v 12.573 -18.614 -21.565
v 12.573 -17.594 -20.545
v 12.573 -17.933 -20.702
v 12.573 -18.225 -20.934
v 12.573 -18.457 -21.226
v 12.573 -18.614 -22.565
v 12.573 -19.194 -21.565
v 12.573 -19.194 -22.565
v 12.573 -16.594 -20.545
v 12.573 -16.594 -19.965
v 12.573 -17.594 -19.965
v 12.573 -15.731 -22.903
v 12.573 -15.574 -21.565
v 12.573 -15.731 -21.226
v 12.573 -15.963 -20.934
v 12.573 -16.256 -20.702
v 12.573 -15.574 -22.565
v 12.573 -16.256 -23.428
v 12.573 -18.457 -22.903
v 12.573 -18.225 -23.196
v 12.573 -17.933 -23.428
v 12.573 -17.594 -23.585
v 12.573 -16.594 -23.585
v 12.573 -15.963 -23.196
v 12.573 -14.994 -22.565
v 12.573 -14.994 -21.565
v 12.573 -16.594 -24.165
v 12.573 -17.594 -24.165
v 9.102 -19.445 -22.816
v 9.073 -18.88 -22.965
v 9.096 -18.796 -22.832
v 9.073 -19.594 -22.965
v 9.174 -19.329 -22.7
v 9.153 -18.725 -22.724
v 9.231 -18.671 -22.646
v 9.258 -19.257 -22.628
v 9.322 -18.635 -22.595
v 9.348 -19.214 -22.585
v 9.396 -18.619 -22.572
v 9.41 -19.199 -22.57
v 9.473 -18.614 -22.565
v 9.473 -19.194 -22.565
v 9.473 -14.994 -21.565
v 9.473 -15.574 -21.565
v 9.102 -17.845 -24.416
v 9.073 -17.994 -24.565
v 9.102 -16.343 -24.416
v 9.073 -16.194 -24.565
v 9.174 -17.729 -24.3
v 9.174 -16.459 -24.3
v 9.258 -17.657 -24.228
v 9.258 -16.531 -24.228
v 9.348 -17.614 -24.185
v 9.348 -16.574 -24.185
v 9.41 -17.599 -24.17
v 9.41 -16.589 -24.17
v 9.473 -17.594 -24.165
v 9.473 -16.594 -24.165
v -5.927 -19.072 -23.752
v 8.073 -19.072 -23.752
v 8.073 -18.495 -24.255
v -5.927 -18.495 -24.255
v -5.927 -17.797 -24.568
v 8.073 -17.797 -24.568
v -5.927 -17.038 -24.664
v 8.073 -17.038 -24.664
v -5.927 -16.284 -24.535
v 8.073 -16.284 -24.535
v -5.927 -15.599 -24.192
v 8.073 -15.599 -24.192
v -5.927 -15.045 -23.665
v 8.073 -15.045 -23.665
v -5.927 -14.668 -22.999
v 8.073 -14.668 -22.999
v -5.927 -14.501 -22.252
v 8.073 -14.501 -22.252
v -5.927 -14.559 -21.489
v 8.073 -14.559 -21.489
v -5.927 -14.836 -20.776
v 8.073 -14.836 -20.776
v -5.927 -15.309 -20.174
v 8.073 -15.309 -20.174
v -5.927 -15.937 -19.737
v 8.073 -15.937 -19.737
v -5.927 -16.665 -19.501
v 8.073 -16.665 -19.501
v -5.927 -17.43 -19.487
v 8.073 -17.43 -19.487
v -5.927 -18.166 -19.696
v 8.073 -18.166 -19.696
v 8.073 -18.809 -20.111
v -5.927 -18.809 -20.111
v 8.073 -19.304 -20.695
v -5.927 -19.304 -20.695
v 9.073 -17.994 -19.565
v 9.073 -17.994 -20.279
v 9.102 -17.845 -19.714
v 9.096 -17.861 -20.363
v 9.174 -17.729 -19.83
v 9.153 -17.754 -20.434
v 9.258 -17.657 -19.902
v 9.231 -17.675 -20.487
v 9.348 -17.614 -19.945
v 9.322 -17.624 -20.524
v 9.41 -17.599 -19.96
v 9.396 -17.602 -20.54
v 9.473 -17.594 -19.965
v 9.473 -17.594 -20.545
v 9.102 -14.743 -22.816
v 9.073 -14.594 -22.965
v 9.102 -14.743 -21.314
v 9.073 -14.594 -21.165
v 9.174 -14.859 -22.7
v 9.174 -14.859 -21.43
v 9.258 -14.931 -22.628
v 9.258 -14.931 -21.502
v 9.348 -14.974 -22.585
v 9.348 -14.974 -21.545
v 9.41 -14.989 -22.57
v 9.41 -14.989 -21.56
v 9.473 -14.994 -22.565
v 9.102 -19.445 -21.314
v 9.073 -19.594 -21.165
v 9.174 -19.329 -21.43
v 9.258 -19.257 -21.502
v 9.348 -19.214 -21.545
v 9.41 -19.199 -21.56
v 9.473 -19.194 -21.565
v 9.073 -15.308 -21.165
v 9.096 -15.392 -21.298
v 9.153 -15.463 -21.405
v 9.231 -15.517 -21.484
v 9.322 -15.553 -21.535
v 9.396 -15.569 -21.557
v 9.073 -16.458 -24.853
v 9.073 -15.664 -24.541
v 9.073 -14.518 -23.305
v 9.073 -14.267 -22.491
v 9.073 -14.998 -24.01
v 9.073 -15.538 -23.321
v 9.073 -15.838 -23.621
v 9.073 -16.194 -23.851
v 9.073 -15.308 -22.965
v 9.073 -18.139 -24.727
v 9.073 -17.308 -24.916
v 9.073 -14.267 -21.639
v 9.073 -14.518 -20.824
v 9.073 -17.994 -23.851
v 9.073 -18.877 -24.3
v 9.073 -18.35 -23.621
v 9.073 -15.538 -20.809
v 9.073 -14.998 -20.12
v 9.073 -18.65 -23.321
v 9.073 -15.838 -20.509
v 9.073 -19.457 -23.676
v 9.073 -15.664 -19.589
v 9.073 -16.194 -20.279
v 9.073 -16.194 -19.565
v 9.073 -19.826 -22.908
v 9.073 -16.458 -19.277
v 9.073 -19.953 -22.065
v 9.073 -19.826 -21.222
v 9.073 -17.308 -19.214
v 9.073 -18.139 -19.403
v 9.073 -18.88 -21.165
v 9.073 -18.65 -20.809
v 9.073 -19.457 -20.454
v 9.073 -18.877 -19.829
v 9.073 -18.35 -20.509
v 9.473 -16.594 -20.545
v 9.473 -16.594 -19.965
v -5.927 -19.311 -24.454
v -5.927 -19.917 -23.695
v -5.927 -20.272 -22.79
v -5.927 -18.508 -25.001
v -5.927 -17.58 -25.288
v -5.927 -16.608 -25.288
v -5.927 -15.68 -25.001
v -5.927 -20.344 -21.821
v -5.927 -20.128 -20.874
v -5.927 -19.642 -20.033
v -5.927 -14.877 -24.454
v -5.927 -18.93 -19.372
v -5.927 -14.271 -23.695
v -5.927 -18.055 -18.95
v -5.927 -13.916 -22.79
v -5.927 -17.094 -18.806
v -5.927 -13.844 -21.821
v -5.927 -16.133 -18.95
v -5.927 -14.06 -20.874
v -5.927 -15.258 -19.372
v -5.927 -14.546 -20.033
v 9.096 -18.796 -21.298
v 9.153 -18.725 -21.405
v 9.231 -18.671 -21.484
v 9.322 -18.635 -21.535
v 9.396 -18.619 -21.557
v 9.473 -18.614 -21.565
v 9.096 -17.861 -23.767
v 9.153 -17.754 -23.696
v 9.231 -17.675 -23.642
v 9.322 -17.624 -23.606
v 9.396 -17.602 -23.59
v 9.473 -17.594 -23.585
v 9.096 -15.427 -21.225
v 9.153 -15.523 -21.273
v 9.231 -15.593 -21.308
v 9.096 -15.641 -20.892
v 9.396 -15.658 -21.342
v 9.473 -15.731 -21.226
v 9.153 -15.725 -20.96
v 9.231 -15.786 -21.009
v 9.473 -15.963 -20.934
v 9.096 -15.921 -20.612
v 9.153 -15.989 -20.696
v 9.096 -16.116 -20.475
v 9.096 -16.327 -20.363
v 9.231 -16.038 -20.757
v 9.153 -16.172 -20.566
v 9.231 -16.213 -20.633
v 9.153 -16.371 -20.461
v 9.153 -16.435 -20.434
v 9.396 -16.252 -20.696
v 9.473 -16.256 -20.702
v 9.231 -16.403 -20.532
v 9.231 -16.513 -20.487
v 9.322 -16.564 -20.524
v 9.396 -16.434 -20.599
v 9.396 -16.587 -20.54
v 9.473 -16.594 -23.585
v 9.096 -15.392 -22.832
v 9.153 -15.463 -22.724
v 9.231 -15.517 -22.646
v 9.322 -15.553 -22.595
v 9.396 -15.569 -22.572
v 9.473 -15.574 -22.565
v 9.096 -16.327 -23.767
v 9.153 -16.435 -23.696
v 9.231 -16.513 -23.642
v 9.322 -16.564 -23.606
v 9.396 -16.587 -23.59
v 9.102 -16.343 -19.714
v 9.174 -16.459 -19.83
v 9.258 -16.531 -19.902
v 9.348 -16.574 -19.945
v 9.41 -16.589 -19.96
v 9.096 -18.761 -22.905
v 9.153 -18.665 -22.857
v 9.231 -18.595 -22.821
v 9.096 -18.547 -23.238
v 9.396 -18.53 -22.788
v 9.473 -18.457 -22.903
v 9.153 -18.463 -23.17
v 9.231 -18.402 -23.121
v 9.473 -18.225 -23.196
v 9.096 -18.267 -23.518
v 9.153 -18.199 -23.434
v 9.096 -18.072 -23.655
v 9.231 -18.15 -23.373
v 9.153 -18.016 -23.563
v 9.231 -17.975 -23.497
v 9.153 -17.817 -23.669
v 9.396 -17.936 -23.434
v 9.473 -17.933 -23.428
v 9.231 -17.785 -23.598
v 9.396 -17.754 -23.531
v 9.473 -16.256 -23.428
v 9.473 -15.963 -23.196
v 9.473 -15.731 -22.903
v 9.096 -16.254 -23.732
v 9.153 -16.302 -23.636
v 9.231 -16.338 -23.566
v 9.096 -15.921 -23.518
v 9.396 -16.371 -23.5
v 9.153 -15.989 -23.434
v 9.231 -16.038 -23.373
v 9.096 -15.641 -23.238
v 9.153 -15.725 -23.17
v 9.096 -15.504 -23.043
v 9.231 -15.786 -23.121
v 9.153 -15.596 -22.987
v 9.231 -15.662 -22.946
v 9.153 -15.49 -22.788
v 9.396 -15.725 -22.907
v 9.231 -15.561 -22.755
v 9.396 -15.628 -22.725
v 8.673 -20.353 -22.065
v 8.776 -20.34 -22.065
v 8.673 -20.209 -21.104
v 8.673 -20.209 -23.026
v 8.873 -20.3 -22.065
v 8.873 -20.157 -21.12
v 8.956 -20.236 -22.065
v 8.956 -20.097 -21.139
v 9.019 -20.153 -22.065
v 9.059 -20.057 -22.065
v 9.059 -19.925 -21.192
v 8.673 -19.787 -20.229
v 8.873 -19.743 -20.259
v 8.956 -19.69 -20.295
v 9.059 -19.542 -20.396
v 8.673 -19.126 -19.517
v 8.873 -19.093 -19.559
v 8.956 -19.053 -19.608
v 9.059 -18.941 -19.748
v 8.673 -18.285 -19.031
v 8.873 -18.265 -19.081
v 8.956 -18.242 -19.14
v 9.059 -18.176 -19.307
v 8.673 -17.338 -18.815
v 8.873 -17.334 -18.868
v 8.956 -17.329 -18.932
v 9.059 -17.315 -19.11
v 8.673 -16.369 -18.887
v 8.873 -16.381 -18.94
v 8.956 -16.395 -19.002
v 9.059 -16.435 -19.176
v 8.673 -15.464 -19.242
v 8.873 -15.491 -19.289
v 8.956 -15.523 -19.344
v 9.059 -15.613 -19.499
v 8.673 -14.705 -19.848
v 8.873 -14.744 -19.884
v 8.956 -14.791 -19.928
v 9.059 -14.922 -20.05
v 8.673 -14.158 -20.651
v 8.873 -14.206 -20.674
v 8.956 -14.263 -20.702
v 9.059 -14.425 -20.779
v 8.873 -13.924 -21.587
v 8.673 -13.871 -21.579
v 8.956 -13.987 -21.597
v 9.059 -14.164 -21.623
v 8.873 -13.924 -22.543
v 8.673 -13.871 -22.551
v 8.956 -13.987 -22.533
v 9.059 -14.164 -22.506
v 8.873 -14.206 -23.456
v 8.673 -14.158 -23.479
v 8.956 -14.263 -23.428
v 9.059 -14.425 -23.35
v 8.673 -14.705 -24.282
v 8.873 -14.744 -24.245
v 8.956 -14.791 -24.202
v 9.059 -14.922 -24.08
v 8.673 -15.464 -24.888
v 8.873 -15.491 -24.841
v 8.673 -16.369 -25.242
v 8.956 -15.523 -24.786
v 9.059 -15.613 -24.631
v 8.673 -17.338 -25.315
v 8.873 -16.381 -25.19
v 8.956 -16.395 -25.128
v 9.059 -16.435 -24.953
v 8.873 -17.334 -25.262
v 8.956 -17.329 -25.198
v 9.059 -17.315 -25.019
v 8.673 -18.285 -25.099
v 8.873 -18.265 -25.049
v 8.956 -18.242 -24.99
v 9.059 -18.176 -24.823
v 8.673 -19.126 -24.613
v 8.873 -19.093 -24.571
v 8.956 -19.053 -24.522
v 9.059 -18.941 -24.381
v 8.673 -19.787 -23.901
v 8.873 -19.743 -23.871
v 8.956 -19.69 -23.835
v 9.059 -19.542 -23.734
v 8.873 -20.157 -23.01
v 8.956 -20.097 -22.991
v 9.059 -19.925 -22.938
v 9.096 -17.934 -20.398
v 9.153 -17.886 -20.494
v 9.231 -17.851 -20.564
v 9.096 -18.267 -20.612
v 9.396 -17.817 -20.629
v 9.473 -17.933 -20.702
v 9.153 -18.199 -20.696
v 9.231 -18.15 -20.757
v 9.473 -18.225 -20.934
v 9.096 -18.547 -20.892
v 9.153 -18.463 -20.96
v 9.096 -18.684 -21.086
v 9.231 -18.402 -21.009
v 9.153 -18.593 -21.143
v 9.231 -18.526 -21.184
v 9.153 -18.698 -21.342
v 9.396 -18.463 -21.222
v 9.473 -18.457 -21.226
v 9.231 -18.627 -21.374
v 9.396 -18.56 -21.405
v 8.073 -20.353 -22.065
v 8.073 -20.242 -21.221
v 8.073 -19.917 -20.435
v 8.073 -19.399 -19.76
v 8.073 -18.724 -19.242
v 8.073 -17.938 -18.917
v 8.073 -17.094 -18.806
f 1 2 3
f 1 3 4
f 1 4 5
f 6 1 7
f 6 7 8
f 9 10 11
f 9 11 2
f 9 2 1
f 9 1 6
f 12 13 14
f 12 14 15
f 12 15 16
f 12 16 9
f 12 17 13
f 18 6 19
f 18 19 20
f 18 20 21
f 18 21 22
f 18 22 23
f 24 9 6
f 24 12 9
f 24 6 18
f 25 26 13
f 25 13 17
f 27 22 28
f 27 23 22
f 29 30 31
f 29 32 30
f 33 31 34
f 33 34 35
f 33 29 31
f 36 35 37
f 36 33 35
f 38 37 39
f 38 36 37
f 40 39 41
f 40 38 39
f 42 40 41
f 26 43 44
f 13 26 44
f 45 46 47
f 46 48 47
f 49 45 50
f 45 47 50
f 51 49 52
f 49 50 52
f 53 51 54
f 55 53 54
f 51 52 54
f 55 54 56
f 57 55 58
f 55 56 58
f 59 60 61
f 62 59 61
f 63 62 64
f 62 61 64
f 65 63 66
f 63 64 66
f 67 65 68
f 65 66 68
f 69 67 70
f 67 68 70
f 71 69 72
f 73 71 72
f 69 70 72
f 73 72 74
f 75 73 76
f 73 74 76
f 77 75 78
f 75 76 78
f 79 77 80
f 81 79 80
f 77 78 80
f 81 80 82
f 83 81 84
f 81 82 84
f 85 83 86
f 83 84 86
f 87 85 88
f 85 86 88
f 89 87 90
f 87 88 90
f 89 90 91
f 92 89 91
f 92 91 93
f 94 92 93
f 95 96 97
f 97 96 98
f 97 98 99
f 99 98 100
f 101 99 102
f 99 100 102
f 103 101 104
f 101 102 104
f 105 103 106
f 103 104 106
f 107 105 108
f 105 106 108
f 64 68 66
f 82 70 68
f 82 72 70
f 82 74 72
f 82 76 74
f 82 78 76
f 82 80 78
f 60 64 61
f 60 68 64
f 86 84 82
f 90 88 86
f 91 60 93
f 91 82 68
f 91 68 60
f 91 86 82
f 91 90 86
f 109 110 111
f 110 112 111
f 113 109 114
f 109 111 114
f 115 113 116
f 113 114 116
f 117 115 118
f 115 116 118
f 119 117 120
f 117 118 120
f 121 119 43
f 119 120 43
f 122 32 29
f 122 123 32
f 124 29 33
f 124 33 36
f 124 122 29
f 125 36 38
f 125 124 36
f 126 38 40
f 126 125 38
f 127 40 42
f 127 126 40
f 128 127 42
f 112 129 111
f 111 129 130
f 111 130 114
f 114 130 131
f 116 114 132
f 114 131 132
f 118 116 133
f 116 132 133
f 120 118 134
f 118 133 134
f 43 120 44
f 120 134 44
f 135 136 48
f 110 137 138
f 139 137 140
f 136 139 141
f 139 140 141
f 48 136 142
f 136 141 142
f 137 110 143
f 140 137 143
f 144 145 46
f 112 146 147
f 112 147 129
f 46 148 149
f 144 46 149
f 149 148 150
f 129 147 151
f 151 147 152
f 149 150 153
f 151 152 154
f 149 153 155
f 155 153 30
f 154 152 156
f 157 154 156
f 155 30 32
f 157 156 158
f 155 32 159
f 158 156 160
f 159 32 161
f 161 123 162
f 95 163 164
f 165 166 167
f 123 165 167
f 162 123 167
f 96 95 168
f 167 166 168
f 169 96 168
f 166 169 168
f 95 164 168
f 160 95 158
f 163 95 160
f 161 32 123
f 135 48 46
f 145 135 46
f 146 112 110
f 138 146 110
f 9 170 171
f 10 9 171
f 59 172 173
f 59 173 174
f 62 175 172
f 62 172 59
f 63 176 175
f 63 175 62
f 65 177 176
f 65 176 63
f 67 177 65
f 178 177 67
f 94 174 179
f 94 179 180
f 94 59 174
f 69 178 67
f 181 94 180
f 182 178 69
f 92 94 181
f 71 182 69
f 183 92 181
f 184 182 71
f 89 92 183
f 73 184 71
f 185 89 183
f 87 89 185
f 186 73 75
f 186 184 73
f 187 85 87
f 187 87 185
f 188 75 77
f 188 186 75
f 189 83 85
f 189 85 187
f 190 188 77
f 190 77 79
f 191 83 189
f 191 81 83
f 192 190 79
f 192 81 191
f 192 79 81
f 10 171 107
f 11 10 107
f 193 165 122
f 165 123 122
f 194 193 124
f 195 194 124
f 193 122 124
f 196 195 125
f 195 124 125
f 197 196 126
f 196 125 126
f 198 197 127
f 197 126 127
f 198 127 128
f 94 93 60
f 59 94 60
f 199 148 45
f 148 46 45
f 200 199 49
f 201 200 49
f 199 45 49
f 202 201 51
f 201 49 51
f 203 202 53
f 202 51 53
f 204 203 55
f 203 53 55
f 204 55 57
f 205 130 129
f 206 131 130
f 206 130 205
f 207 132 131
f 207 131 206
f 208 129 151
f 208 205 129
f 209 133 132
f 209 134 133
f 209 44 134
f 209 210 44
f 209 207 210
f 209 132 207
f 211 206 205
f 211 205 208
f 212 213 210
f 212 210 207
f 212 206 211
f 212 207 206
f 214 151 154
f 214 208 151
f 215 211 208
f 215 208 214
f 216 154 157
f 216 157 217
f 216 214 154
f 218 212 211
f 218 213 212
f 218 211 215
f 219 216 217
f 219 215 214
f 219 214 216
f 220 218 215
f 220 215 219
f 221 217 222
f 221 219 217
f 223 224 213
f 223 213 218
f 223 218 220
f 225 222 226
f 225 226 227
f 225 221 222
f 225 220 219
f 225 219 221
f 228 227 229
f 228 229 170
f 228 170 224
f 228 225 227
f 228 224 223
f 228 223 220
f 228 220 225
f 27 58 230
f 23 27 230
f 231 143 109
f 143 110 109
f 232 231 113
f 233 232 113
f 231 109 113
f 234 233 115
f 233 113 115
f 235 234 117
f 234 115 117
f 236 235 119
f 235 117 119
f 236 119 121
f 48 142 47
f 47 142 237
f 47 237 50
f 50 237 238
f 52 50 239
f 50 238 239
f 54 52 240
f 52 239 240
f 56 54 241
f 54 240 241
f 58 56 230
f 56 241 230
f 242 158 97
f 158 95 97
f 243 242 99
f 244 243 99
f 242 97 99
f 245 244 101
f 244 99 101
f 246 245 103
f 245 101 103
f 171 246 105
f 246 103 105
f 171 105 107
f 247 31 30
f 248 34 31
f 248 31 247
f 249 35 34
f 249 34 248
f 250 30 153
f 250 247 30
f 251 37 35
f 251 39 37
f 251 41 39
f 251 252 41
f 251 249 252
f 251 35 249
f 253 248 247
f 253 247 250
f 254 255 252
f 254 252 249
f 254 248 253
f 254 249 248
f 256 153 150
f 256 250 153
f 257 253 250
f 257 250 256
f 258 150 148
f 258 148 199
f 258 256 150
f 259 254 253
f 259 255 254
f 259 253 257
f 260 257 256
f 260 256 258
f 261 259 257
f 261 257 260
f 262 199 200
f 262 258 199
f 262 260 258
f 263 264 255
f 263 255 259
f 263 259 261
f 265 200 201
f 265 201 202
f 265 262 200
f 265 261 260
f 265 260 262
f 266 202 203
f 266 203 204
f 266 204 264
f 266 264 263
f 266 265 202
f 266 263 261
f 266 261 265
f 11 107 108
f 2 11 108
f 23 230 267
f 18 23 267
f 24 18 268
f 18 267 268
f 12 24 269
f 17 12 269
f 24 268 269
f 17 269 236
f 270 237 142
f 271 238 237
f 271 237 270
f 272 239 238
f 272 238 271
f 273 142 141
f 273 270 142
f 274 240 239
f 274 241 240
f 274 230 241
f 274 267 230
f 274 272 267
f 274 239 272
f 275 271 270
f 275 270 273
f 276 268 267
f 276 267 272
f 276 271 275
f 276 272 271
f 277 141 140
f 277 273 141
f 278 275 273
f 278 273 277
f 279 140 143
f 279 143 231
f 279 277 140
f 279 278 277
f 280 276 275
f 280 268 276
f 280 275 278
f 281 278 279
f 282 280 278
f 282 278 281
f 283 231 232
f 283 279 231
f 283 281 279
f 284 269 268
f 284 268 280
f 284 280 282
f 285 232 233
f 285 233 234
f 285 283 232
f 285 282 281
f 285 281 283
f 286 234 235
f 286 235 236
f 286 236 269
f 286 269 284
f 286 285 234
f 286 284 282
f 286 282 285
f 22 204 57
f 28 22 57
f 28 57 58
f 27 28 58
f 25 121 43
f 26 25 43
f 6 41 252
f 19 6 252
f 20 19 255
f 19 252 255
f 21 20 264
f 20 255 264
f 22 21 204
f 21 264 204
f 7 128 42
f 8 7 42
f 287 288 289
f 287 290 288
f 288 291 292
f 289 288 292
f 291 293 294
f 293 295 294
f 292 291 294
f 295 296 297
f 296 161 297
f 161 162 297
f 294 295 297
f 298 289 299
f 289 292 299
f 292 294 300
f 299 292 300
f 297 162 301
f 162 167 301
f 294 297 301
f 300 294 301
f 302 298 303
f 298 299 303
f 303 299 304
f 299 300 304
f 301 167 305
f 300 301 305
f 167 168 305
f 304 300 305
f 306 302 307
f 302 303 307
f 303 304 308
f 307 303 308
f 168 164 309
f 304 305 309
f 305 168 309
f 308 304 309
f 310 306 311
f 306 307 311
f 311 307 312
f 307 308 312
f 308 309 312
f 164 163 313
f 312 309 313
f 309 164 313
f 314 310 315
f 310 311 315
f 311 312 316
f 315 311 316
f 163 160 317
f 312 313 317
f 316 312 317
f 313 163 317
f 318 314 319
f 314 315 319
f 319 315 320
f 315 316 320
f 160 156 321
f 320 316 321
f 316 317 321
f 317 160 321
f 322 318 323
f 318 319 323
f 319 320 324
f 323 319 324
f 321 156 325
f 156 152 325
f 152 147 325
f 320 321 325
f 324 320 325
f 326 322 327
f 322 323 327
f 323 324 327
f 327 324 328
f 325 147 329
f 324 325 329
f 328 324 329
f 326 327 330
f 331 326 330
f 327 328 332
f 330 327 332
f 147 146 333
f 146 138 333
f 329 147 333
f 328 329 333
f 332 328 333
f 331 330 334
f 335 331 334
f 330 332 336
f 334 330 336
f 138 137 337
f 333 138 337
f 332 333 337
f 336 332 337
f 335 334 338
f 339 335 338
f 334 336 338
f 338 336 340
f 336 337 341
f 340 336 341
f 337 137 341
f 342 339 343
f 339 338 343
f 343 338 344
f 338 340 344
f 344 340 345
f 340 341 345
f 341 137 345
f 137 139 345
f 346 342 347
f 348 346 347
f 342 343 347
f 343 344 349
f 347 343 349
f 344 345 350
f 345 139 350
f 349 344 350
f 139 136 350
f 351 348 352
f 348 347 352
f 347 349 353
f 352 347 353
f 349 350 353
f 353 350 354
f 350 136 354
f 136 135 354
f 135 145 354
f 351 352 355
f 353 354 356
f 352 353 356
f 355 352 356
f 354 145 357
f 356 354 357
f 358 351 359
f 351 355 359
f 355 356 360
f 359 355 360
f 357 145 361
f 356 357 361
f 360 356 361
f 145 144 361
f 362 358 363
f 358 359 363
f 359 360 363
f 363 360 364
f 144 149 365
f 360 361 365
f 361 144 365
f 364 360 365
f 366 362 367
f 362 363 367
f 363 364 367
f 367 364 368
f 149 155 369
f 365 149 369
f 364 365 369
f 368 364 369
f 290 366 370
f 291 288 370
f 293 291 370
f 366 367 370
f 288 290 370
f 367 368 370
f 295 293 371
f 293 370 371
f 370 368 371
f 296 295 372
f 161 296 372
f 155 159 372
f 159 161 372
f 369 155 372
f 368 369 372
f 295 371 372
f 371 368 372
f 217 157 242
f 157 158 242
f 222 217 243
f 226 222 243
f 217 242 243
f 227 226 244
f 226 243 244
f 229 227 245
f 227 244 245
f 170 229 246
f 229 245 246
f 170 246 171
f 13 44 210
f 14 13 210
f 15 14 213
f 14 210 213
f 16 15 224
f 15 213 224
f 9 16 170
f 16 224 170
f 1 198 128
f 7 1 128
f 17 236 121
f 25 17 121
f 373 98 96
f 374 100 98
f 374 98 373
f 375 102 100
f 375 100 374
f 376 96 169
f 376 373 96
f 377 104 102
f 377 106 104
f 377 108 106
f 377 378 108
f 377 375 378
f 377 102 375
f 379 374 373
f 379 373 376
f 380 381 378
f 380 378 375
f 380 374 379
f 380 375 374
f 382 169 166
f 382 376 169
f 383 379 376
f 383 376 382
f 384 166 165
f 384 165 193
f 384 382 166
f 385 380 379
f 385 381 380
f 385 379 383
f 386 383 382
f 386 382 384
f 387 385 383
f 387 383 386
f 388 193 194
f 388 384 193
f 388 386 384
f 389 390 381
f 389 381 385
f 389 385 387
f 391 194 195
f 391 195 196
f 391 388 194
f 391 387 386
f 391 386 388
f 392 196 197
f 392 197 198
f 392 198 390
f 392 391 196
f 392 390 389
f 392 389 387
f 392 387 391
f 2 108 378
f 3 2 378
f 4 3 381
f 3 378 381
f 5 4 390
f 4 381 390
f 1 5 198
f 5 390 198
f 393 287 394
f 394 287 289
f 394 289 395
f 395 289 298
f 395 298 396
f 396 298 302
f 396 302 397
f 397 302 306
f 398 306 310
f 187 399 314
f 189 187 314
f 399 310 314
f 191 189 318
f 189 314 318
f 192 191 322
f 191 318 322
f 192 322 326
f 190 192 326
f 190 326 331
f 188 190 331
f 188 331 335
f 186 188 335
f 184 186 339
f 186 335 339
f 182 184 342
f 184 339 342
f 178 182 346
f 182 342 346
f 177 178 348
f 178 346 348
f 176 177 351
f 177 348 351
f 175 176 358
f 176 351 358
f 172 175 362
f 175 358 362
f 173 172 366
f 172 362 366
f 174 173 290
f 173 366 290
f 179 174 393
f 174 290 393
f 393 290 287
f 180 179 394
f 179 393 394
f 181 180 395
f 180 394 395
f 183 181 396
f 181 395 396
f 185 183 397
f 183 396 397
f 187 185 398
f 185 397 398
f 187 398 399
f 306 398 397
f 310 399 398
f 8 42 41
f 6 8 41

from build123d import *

# Parameters (mm, degrees)
BOSS_EXTRUDE1_DEPTH = 3.5
SKETCH1_3_R         = 3.259306638
BOSS_EXTRUDE2_DEPTH = 1
SKETCH1_4_R         = 3.259306638
BOSS_EXTRUDE3_DEPTH = 15
FILLET1_R           = 0.4


with BuildPart() as part:
    # Sketch1 → Boss-Extrude1 (new body)
    with BuildSketch(Plane.ZY.offset(-9.072873839)):
        with BuildLine():
            Line((-22.564889637, -14.994040891), (-21.564889637, -14.994040891))
            Line((-21.564889637, -14.994040891), (-21.564889637, -15.574172475))
            ThreePointArc((-21.564889637, -15.574172475), (-20.933518787, -15.962670041), (-20.545021222, -16.594040891))
            Line((-20.545021222, -16.594040891), (-19.964889637, -16.594040891))
            Line((-19.964889637, -16.594040891), (-19.964889637, -17.594040891))
            Line((-19.964889637, -17.594040891), (-20.545021222, -17.594040891))
            ThreePointArc((-20.545021222, -17.594040891), (-20.933518787, -18.225411741), (-21.564889637, -18.613909306))
            Line((-21.564889637, -18.613909306), (-21.564889637, -19.194040891))
            Line((-21.564889637, -19.194040891), (-22.564889637, -19.194040891))
            Line((-22.564889637, -19.194040891), (-22.564889637, -18.613909306))
            ThreePointArc((-22.564889637, -18.613909306), (-23.196260487, -18.225411741), (-23.584758053, -17.594040891))
            Line((-23.584758053, -17.594040891), (-24.164889637, -17.594040891))
            Line((-24.164889637, -17.594040891), (-24.164889637, -16.594040891))
            Line((-24.164889637, -16.594040891), (-23.584758053, -16.594040891))
            ThreePointArc((-23.584758053, -16.594040891), (-23.196260487, -15.962670041), (-22.564889637, -15.574172475))
            Line((-22.564889637, -15.574172475), (-22.564889637, -14.994040891))
        make_face()
    extrude(amount=-BOSS_EXTRUDE1_DEPTH)

    # Sketch1<3> → Boss-Extrude2 (add)
    with BuildSketch(Plane.ZY.offset(-9.072873839)):
        with Locations((-22.064889637, -17.094040891)):
            Circle(SKETCH1_3_R)
    extrude(amount=BOSS_EXTRUDE2_DEPTH)

    # Sketch1<4> → Boss-Extrude3 (add)
    with BuildSketch(Plane.ZY.offset(-9.072873839)):
        with Locations((-22.064889637, -17.094040891)):
            Circle(SKETCH1_4_R)
        with BuildLine():
            ThreePointArc((-23.752066801, -19.072280821), (-21.868548232, -14.501464942), (-20.694879361, -19.303808263))
            Line((-20.694879361, -19.303808263), (-23.752066801, -19.072280821))
        make_face(mode=Mode.SUBTRACT)
    extrude(amount=BOSS_EXTRUDE3_DEPTH)

    # Fillet1
    fillet1_edges = [part.edges().sort_by_distance(p)[0] for p in [
        (9.072873839, -17.094040891, -25.324196275),
        (9.072873839, -18.225411741, -23.196260487),
        (9.072873839, -17.594040891, -23.874823845),
        (9.072873839, -17.094040891, -24.164889637),
        (9.072873839, -16.594040891, -23.874823845),
        (9.072873839, -15.962670041, -23.196260487),
        (9.072873839, -15.284106683, -22.564889637),
        (9.072873839, -14.994040891, -22.064889637),
        (9.072873839, -15.284106683, -21.564889637),
        (9.072873839, -15.962670041, -20.933518787),
        (9.072873839, -16.594040891, -20.25495543),
        (9.072873839, -17.094040891, -19.964889637),
        (9.072873839, -17.594040891, -20.25495543),
        (9.072873839, -18.225411741, -20.933518787),
        (9.072873839, -18.903975098, -21.564889637),
        (9.072873839, -19.194040891, -22.064889637),
        (9.072873839, -18.903975098, -22.564889637),
    ]]
    fillet(fillet1_edges, radius=FILLET1_R)


solid = part.part
